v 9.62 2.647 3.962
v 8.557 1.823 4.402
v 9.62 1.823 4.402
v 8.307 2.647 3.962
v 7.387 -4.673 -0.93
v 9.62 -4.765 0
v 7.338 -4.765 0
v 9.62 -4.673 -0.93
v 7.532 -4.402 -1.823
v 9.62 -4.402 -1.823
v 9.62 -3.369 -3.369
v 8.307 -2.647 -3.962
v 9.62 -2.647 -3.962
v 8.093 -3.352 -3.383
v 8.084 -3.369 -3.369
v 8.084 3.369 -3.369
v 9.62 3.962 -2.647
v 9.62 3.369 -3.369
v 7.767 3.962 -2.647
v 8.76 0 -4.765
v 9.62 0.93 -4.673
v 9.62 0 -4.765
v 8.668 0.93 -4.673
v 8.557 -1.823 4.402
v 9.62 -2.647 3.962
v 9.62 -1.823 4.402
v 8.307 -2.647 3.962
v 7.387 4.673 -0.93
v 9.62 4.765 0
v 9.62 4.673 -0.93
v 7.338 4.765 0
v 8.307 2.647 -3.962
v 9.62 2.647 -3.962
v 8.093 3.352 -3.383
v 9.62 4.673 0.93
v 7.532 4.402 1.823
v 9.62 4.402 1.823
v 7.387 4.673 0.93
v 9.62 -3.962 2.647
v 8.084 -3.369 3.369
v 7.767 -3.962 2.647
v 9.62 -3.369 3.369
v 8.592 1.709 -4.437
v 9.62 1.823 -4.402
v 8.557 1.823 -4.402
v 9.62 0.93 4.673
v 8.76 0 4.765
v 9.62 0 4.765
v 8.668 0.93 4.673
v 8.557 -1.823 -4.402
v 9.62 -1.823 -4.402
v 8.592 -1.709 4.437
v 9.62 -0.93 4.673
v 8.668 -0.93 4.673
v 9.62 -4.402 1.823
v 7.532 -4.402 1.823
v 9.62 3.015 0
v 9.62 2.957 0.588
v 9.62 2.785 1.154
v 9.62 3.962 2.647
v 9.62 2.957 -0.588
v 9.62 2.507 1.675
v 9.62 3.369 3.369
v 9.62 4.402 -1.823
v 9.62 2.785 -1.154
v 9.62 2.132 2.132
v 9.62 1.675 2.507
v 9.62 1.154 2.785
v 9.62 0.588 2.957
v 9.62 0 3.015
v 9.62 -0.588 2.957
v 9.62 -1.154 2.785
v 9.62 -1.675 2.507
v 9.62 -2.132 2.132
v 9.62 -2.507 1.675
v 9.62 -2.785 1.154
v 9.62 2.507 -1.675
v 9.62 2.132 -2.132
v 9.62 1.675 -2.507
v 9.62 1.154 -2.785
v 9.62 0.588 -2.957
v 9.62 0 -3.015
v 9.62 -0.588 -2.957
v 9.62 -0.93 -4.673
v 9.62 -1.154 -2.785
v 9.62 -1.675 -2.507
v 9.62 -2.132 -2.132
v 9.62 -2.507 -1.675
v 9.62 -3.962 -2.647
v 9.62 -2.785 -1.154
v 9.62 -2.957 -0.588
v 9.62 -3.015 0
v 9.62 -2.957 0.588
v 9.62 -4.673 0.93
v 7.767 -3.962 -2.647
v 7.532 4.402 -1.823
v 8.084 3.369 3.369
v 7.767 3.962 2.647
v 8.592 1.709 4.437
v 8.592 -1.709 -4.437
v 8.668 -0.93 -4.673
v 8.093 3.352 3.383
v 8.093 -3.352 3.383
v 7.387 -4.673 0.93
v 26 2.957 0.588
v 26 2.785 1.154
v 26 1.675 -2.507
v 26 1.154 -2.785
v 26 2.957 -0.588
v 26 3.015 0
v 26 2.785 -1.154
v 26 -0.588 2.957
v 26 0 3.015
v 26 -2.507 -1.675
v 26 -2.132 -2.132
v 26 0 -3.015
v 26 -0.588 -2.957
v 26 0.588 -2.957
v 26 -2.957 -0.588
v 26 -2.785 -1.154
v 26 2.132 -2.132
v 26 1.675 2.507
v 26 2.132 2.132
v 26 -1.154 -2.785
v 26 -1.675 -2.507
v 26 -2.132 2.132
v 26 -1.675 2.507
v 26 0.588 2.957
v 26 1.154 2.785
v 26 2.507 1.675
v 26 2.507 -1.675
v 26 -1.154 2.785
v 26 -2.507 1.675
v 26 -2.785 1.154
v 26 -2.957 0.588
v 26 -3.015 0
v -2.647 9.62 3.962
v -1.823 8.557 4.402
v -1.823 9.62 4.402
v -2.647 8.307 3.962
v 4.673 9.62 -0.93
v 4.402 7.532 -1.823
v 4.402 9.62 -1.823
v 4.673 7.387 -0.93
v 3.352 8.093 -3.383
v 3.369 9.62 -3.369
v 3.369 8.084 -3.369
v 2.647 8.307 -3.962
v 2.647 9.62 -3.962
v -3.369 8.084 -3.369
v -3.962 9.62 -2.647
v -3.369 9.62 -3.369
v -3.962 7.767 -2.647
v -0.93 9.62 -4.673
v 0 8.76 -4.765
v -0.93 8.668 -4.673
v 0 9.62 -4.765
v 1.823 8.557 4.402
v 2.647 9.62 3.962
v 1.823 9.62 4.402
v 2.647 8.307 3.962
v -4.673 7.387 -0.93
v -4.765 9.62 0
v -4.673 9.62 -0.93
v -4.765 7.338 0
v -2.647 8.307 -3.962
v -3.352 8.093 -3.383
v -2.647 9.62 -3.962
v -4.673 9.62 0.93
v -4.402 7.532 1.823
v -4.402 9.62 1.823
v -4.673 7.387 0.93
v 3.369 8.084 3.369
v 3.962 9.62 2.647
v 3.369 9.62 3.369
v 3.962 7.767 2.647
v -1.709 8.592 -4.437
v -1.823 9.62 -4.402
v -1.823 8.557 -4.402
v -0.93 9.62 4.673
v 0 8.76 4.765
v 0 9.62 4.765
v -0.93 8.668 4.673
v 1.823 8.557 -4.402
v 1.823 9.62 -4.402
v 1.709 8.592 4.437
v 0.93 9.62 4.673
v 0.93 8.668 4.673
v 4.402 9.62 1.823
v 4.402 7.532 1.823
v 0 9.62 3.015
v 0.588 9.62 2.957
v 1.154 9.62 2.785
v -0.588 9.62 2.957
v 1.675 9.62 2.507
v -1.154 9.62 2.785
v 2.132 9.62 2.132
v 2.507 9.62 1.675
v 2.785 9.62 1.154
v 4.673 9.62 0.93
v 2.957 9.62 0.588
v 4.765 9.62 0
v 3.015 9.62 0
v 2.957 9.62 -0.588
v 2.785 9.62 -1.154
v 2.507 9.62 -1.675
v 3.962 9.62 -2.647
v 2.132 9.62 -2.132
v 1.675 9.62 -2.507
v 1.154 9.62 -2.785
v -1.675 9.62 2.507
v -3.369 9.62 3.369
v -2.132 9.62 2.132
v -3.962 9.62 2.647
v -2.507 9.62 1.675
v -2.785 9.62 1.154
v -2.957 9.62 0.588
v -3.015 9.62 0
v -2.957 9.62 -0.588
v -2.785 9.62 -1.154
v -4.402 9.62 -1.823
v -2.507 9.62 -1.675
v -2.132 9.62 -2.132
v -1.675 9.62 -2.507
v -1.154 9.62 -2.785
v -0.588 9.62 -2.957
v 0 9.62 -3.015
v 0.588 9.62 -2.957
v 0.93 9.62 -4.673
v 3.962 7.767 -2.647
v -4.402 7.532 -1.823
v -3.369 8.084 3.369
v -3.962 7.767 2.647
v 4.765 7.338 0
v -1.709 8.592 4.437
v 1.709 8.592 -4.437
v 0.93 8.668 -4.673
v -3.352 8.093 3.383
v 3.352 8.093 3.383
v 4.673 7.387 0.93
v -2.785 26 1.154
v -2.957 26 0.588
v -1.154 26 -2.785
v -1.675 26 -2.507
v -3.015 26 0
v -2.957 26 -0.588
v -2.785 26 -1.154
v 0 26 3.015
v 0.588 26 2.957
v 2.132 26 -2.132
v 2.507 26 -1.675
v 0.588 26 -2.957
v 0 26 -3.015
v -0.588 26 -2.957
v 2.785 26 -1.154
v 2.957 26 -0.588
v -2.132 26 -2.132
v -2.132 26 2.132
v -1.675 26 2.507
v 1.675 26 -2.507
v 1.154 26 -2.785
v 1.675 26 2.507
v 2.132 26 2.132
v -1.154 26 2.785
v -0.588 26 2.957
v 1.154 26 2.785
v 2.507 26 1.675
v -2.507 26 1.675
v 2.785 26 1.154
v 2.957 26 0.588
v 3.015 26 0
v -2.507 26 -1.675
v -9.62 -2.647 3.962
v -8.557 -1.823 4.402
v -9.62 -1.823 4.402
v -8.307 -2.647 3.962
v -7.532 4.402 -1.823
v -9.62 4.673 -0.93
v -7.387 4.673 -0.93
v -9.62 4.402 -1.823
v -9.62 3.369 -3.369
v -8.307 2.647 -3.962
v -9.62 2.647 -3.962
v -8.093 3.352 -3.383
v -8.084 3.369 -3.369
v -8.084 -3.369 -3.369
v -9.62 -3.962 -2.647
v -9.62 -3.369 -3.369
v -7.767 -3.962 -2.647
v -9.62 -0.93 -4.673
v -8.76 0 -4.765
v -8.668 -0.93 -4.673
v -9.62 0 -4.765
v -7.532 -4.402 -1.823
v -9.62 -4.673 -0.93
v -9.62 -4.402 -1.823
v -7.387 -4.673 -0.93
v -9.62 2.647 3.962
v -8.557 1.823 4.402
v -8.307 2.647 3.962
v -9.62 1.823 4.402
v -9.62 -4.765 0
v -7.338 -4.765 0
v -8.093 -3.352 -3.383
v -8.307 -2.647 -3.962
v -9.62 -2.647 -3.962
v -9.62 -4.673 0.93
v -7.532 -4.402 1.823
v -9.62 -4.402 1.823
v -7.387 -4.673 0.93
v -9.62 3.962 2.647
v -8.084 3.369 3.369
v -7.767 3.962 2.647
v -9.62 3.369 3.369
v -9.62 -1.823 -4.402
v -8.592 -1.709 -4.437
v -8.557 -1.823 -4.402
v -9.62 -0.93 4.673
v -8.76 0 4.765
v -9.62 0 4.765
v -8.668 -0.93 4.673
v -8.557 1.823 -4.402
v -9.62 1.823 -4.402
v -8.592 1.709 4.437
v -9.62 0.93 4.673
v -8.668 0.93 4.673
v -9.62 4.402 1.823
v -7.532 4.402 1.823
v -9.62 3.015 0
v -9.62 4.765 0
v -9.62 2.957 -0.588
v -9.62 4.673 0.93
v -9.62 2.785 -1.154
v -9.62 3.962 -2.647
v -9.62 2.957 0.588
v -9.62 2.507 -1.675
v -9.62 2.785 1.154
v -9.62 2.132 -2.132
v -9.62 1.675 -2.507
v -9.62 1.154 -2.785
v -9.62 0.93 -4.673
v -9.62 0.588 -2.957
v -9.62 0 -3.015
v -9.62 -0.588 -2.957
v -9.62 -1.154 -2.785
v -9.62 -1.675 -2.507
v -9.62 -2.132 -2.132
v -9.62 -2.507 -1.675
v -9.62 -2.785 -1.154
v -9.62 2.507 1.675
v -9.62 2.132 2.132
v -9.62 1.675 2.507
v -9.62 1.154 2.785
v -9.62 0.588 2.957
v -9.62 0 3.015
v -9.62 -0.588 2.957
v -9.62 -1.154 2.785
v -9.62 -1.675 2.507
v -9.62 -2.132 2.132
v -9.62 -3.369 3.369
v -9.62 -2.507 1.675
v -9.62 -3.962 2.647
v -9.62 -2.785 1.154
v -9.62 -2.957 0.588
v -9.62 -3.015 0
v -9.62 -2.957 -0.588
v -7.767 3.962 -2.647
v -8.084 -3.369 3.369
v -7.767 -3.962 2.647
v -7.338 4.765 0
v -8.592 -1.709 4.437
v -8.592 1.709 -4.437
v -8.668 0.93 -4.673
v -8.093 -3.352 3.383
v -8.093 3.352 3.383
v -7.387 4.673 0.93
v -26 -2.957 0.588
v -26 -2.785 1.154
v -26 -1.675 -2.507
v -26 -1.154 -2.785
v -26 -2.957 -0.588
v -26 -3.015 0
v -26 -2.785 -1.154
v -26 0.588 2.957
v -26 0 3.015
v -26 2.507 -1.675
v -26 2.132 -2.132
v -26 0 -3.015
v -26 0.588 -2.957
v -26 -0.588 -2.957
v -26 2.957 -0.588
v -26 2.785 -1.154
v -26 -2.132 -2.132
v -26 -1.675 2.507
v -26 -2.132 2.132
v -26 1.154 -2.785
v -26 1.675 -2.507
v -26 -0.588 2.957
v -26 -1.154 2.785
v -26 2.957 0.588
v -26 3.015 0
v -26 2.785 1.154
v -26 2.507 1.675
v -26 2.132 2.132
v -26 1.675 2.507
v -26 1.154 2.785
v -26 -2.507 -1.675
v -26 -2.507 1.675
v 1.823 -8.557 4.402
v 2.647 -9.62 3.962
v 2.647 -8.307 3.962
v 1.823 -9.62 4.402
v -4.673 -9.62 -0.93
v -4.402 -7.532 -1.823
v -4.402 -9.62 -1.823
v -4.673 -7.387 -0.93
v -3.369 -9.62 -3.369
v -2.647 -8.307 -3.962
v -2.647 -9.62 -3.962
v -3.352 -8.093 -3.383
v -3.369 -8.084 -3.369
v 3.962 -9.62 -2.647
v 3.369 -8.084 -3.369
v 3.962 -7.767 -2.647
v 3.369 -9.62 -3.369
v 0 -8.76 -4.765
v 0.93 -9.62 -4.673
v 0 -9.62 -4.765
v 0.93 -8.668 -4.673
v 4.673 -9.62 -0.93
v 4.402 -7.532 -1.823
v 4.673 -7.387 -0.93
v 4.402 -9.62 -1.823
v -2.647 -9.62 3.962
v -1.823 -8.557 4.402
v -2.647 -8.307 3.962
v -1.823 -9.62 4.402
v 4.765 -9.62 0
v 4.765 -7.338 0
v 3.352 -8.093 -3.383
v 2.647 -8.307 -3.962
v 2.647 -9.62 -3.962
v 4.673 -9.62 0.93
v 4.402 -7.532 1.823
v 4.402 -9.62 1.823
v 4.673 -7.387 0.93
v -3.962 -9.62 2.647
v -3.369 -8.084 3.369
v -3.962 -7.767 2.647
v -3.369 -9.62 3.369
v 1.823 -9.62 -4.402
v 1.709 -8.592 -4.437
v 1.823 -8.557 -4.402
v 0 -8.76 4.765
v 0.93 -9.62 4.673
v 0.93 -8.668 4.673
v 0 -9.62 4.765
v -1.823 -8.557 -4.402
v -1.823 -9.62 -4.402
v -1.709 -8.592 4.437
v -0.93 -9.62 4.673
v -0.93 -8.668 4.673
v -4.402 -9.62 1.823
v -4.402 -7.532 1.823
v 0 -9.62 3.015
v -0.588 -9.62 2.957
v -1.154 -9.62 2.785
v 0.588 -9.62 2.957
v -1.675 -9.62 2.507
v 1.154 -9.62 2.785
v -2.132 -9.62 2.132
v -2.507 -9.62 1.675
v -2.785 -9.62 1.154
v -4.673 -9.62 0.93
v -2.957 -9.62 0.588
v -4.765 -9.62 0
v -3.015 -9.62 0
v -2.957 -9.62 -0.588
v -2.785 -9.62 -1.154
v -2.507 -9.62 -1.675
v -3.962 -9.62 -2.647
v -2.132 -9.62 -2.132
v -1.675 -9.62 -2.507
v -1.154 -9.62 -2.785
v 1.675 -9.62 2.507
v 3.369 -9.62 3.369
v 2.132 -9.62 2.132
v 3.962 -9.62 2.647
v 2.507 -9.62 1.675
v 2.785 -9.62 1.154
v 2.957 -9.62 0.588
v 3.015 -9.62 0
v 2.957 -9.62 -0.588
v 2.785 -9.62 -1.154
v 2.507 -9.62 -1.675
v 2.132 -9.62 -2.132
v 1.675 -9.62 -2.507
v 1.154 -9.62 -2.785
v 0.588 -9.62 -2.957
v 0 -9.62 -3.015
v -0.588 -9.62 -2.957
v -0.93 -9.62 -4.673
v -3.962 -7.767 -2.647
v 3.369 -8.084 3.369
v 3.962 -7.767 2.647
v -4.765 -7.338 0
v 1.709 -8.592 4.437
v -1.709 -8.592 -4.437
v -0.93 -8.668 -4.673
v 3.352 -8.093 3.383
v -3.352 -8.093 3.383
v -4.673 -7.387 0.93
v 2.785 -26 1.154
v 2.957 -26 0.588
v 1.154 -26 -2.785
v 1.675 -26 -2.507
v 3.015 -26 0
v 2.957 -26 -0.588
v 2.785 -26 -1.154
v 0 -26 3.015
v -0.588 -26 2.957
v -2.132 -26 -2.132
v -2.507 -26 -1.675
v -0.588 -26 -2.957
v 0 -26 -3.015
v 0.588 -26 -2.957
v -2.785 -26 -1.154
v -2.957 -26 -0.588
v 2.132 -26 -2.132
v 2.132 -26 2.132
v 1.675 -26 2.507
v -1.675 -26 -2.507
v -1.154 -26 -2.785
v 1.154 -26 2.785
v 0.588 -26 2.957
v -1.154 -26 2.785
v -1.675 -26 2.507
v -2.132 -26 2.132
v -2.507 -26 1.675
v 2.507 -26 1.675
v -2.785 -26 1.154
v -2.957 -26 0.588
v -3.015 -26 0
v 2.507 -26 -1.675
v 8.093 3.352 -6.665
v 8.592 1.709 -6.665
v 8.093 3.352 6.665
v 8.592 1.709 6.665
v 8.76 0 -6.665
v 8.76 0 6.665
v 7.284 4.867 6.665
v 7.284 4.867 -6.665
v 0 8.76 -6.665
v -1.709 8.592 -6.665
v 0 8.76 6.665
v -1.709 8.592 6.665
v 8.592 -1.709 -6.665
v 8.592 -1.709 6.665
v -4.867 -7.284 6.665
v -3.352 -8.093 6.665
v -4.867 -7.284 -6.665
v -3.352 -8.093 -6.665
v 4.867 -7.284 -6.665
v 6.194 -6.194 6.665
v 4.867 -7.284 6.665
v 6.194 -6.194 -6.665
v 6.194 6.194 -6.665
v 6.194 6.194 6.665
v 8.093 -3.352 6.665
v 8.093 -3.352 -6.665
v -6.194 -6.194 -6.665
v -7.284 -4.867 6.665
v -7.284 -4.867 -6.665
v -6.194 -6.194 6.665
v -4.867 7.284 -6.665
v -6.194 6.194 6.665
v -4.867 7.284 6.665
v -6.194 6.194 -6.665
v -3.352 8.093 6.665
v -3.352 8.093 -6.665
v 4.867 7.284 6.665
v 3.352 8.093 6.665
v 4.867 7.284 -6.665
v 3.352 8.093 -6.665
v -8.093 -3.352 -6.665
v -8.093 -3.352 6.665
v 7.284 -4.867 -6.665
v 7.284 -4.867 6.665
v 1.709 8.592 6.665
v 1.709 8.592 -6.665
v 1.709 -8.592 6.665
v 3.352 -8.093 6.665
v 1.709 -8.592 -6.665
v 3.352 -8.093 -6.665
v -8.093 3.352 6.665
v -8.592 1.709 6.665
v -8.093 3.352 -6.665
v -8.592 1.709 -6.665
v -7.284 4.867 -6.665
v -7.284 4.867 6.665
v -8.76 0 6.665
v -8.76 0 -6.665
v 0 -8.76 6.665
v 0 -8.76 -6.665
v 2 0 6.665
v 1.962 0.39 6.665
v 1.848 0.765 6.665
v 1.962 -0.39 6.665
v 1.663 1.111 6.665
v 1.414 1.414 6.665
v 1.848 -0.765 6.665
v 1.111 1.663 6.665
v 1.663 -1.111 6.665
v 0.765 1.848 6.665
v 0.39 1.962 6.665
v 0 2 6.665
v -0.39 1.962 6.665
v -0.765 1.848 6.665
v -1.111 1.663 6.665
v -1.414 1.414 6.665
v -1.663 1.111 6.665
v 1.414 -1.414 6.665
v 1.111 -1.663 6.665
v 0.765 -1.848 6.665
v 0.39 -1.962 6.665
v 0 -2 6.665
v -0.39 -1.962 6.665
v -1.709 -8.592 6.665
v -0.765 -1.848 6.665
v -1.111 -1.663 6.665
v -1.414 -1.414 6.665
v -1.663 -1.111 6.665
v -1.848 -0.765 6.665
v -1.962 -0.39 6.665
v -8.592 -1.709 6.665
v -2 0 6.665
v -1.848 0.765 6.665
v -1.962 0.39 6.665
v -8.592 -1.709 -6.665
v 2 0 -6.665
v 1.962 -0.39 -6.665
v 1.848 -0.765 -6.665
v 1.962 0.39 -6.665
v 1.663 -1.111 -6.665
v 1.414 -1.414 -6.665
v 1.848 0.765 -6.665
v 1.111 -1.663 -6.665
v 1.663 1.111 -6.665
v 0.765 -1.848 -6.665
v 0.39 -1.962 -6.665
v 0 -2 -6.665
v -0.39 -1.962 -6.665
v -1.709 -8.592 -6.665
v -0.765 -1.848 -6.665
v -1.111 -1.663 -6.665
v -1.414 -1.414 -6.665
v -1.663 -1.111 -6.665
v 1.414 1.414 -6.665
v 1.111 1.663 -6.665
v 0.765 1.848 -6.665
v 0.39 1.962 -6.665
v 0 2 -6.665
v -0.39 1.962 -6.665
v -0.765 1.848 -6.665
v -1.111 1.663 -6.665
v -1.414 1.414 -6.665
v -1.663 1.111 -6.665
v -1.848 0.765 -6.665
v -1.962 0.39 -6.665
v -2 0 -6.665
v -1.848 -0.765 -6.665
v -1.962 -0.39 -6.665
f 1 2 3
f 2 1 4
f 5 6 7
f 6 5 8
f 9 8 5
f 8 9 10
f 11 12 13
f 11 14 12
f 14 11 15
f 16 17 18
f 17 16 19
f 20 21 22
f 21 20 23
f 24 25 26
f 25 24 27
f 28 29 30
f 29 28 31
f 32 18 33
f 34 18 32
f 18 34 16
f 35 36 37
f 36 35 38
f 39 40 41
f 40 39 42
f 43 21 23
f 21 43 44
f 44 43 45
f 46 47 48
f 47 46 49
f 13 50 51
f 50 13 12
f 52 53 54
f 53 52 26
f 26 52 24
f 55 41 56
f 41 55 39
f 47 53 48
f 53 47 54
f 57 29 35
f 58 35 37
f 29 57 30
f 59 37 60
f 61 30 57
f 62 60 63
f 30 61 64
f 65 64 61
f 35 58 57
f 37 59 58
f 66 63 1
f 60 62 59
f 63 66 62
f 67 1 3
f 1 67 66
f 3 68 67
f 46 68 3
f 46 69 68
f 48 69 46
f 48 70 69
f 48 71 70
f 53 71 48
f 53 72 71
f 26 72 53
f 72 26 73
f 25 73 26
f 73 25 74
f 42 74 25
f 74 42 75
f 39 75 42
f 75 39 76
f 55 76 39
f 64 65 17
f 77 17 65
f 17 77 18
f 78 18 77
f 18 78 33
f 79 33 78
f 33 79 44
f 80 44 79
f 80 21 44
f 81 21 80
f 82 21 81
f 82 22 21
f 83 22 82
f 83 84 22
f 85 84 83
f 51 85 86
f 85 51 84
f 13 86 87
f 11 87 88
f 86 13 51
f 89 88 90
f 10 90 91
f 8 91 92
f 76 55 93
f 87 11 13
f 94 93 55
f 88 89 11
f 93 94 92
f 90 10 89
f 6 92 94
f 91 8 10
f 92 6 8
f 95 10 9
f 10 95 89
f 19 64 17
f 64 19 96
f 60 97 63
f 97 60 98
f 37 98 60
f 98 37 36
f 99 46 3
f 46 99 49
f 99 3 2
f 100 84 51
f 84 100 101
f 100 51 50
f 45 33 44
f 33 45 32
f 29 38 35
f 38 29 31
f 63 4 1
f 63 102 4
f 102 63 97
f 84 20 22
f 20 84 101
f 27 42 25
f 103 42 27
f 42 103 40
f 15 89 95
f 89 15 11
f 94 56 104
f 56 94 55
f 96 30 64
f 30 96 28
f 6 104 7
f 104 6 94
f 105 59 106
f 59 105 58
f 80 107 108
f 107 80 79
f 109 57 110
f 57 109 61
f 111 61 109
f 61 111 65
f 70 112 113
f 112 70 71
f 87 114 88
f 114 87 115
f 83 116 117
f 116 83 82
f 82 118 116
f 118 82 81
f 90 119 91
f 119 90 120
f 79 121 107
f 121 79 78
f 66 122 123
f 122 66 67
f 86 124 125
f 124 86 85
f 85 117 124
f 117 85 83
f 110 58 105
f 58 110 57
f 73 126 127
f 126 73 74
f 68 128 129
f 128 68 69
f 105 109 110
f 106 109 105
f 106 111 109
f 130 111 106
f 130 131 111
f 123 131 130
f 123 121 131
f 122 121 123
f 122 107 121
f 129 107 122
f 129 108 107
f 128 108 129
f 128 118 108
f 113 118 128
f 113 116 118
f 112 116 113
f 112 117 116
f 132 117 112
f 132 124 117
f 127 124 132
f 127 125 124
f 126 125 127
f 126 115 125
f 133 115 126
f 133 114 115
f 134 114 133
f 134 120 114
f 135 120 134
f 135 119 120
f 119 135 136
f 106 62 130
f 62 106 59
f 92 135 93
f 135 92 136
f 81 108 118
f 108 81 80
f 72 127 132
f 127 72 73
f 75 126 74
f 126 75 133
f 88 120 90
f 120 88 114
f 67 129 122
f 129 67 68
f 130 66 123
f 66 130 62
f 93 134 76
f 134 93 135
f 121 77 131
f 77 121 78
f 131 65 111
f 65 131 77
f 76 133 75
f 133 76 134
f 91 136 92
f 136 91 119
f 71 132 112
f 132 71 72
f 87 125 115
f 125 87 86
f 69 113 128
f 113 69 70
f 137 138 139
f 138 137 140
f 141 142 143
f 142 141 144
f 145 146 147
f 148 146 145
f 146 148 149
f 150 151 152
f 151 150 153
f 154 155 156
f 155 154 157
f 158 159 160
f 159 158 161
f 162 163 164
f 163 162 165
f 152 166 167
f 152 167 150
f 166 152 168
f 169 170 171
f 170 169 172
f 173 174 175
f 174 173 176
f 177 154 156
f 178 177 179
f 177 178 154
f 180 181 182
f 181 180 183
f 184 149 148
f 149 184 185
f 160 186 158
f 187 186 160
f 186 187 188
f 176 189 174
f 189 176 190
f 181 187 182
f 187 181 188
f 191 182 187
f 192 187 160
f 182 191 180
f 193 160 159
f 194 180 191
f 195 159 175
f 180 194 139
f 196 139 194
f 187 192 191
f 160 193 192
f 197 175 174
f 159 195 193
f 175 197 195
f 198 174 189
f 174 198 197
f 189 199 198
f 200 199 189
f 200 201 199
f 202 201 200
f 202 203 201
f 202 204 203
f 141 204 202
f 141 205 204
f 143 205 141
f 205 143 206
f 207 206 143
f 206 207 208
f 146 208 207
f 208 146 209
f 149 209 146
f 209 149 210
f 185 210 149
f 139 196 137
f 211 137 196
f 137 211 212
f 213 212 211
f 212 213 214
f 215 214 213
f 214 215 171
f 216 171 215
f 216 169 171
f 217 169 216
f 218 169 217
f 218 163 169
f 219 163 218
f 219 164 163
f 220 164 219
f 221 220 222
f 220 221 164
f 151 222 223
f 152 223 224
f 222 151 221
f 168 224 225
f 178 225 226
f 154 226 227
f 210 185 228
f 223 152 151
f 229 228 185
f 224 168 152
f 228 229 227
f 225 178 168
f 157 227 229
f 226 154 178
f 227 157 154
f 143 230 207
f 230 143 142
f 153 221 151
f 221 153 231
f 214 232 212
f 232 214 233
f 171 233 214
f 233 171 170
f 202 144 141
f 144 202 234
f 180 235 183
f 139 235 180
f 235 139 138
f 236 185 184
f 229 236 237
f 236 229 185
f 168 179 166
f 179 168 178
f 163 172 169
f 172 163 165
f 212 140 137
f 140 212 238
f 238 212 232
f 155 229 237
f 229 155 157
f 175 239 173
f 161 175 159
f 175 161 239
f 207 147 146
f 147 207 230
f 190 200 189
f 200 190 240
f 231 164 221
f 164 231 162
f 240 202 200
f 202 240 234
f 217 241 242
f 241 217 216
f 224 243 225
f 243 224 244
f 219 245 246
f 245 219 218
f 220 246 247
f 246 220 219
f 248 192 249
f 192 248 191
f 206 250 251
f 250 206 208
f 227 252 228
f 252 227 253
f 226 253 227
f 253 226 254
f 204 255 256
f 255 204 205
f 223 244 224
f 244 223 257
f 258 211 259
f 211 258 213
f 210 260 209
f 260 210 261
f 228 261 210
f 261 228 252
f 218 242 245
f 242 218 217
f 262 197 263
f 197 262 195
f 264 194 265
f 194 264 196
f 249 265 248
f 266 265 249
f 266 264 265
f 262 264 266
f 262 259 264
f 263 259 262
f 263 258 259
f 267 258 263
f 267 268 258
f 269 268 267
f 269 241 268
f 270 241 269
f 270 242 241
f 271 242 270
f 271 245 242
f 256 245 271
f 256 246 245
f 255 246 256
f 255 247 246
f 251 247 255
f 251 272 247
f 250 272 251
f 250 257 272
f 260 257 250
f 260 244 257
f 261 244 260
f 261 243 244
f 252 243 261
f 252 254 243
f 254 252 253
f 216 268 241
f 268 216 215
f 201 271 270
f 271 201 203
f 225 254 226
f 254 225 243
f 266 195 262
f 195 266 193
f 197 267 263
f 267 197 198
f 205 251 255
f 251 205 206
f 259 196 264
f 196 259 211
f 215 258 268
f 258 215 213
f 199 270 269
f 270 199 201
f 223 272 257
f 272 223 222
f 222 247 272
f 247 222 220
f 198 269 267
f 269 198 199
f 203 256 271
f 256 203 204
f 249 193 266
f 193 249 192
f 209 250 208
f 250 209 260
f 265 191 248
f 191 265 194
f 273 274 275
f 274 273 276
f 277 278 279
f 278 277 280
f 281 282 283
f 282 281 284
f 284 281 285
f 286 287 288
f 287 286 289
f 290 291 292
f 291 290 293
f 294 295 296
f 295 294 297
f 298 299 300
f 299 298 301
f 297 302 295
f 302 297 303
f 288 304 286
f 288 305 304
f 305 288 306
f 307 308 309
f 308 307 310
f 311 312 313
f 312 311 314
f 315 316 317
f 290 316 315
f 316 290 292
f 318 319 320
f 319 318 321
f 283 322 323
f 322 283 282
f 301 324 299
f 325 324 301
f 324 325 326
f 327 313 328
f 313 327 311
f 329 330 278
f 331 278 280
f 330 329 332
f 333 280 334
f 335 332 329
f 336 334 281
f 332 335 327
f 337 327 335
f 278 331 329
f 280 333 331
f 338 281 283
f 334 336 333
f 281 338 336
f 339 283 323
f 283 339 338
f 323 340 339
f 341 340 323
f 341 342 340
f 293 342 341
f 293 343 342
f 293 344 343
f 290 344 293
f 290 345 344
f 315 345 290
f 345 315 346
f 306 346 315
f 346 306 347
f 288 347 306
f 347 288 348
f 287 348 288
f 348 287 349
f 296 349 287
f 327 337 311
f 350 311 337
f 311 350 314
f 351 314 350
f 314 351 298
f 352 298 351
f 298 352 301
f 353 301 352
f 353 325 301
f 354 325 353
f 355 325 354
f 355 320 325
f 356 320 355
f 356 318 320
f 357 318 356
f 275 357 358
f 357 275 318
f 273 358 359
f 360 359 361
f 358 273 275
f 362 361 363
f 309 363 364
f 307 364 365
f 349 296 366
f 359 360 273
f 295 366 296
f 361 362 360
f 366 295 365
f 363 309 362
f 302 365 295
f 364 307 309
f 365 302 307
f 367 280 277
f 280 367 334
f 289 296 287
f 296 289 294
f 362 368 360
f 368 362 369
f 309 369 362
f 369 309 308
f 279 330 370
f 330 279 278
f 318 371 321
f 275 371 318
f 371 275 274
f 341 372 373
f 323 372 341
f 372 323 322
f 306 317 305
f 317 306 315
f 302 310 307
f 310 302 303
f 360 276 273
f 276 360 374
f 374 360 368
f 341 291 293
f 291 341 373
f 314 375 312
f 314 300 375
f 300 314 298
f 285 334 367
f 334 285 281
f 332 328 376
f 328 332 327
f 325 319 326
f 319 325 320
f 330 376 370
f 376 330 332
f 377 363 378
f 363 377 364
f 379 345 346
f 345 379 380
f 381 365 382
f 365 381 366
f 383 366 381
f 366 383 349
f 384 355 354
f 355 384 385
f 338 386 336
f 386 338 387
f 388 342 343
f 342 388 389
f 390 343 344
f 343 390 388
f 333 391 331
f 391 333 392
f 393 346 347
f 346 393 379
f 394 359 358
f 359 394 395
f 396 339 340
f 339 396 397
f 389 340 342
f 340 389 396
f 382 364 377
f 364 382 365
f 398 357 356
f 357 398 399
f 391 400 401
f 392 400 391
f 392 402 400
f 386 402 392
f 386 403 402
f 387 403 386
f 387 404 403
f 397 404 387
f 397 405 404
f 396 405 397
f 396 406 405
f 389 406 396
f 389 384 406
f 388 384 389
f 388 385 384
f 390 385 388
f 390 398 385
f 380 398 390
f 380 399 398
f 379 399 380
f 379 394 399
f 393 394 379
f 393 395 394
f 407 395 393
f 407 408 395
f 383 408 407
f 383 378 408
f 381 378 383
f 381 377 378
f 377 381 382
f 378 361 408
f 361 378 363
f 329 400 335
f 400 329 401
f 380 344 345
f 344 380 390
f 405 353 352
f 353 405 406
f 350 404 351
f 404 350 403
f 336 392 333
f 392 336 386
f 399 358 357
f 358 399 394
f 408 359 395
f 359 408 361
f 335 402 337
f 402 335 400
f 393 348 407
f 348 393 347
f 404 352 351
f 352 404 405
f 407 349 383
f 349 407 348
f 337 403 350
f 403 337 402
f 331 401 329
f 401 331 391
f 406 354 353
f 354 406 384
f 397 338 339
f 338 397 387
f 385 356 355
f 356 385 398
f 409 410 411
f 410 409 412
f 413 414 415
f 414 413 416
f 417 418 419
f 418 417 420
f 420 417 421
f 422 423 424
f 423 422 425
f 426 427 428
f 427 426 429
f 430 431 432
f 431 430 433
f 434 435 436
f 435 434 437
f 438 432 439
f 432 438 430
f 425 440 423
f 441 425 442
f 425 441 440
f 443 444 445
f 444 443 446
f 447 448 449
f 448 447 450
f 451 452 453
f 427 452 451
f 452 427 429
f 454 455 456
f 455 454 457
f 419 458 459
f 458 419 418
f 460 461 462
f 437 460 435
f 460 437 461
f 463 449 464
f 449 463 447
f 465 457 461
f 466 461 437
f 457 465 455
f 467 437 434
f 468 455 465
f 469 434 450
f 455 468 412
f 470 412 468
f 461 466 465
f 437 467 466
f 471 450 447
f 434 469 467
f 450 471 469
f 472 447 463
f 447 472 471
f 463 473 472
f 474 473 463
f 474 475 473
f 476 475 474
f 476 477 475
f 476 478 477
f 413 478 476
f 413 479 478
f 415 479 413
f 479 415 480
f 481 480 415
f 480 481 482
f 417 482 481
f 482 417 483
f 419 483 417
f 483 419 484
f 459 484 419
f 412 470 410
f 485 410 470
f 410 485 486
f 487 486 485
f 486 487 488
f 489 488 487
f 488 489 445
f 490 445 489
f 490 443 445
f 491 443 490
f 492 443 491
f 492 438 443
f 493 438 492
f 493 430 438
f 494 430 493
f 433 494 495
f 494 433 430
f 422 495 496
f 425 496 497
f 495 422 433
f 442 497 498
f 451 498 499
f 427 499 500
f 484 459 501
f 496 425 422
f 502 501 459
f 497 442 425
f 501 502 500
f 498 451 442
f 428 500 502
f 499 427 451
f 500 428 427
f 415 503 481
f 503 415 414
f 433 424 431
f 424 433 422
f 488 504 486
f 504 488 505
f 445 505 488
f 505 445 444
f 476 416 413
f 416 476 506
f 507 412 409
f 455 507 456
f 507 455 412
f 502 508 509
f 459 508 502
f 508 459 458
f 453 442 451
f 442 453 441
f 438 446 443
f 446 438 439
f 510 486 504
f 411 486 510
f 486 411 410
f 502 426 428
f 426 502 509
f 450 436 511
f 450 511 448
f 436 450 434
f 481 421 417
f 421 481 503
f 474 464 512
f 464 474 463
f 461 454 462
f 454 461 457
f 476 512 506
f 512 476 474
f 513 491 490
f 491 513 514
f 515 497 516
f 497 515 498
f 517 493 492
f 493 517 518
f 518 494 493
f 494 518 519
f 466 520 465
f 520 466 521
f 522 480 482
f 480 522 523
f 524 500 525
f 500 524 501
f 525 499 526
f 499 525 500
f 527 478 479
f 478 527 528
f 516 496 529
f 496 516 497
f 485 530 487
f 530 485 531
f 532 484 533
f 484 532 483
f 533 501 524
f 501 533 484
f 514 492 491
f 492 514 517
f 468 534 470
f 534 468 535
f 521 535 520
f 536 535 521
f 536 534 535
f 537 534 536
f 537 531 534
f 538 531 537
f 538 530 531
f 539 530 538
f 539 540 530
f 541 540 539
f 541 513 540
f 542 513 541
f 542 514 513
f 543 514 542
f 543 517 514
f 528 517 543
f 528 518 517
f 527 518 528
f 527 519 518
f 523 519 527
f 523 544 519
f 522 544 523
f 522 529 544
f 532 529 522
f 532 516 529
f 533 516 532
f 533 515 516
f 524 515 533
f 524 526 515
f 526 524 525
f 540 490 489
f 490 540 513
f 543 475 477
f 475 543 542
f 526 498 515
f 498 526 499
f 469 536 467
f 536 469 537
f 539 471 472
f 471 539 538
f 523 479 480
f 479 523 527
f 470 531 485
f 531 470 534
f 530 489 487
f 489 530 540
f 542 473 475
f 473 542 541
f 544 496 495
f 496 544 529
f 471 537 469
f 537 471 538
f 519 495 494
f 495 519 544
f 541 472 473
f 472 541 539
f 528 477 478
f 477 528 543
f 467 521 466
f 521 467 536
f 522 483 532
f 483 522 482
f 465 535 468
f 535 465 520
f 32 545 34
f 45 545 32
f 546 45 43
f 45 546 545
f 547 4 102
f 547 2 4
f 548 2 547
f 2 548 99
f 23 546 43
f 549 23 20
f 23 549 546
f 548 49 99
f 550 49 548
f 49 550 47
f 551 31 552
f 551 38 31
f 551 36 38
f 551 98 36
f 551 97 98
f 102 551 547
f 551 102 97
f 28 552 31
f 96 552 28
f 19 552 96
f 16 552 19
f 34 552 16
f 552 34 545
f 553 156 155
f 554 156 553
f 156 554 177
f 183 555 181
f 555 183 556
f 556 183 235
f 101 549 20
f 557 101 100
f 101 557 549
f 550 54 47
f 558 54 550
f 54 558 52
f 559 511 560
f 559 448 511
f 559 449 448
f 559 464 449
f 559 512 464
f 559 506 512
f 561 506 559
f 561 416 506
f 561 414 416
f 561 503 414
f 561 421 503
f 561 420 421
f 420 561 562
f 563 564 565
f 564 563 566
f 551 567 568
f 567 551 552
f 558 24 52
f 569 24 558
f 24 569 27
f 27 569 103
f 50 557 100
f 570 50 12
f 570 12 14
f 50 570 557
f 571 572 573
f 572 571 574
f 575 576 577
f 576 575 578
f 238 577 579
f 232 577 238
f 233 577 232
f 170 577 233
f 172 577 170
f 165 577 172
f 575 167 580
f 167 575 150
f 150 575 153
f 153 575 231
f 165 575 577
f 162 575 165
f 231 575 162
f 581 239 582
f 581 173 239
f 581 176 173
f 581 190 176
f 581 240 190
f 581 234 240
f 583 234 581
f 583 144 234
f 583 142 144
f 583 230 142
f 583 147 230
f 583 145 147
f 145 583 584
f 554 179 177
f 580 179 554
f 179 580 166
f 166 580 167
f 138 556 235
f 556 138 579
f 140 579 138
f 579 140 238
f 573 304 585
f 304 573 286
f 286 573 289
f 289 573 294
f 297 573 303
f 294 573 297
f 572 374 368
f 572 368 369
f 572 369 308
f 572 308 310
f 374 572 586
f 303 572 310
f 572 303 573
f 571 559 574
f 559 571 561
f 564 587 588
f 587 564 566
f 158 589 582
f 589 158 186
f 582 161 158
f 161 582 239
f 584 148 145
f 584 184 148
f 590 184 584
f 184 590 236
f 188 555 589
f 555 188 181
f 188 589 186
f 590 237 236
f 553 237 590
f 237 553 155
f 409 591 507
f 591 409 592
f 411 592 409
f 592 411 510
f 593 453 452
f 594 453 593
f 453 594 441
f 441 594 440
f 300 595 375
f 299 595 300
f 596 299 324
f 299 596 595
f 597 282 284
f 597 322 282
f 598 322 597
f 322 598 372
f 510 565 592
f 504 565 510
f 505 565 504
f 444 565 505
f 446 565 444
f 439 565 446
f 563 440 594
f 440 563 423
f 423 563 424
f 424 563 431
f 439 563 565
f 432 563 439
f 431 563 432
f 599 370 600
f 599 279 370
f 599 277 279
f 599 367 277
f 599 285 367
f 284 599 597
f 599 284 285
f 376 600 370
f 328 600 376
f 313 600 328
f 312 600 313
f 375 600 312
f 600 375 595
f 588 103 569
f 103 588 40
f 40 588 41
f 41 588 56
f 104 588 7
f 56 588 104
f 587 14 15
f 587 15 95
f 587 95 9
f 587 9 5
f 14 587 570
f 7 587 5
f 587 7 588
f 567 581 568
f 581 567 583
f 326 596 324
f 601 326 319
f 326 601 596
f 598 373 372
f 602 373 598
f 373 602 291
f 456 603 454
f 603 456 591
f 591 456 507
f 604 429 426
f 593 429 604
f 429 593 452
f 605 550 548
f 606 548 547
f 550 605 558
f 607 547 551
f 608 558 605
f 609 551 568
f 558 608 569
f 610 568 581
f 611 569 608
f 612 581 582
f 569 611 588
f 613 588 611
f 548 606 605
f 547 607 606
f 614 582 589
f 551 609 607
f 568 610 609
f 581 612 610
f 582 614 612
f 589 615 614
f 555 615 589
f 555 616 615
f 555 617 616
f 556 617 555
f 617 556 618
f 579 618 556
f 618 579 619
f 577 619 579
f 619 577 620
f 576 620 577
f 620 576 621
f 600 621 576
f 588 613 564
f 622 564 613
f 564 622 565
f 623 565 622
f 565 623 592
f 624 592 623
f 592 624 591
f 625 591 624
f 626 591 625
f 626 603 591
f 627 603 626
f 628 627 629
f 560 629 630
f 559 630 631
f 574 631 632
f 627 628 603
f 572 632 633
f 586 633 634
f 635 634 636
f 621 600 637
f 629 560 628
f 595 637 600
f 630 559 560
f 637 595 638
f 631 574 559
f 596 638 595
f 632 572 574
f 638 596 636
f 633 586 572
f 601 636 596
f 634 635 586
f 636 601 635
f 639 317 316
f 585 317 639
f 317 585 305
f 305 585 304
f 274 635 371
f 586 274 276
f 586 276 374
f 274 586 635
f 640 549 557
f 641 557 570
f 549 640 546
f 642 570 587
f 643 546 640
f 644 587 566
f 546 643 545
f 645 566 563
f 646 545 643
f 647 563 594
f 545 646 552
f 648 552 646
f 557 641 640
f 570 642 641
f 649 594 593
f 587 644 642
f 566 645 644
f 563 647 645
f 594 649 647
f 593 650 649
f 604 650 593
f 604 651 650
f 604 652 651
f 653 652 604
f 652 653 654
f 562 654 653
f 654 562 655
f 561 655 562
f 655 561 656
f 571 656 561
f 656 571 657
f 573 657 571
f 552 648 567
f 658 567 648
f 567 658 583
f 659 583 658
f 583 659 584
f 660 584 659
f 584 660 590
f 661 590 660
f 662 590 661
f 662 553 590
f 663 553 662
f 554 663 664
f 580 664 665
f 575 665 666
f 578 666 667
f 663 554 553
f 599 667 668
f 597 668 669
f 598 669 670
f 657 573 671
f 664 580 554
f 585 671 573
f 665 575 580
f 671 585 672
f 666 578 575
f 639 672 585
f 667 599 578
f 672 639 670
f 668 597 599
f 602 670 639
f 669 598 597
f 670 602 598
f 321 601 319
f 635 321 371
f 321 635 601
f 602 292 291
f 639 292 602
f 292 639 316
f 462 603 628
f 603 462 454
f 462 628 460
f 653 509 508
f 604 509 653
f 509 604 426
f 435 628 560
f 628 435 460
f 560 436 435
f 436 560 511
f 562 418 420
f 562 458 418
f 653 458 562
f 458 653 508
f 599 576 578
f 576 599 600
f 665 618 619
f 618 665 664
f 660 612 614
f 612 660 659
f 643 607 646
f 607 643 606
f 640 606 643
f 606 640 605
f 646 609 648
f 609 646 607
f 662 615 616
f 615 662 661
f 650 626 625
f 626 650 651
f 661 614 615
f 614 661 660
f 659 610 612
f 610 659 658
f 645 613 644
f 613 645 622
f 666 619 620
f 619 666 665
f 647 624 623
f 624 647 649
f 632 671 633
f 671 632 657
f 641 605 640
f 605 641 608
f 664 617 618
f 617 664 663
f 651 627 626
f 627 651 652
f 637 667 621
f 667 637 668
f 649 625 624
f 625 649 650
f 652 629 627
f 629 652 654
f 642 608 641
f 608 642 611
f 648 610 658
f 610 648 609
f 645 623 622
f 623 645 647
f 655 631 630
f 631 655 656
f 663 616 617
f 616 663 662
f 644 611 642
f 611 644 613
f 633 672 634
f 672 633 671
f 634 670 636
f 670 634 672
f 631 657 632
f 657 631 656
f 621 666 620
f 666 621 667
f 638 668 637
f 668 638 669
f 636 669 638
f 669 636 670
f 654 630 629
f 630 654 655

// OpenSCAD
$fn = 32;

// ----------------------------------------------------------------------
// Cardan cross: 52 mm span, 9.53 mm trunnions
// ----------------------------------------------------------------------

// --- parameters (mm) ---
journal_d = 9.53;         // trunnion diameter
arm_len = 26;             // trunnion length from the centre
step_r = 3.24;            // step position from the centre
step_d = 6.03;            // journal diameter after the step
hub_d = 17.52;            // hub diameter
hub_h = 13.33;            // hub height
bore_d = 4;               // hub bore

difference() {
  union() {
    /* hub along the joint axis */
    cylinder(h = hub_h, d = hub_d, center = true);
    for (a = [0 : 90 : 270]) rotate([0, 0, a]) {
      /* trunnion, sunk into the hub */
      translate([hub_d / 4, 0, 0]) rotate([0, 90, 0]) cylinder(h = step_r + 2, d = journal_d);
      /* stepped journal out to the tip */
      translate([step_r - 0.5, 0, 0]) rotate([0, 90, 0]) cylinder(h = arm_len + 0.5 - step_r, d = step_d);
    }
  }
  /* lubrication bore through the hub, 2.5 mm clear on both sides */
  translate([0, 0, -hub_h / 2 - 2.5]) cylinder(h = hub_h + 5, d = bore_d);
}
